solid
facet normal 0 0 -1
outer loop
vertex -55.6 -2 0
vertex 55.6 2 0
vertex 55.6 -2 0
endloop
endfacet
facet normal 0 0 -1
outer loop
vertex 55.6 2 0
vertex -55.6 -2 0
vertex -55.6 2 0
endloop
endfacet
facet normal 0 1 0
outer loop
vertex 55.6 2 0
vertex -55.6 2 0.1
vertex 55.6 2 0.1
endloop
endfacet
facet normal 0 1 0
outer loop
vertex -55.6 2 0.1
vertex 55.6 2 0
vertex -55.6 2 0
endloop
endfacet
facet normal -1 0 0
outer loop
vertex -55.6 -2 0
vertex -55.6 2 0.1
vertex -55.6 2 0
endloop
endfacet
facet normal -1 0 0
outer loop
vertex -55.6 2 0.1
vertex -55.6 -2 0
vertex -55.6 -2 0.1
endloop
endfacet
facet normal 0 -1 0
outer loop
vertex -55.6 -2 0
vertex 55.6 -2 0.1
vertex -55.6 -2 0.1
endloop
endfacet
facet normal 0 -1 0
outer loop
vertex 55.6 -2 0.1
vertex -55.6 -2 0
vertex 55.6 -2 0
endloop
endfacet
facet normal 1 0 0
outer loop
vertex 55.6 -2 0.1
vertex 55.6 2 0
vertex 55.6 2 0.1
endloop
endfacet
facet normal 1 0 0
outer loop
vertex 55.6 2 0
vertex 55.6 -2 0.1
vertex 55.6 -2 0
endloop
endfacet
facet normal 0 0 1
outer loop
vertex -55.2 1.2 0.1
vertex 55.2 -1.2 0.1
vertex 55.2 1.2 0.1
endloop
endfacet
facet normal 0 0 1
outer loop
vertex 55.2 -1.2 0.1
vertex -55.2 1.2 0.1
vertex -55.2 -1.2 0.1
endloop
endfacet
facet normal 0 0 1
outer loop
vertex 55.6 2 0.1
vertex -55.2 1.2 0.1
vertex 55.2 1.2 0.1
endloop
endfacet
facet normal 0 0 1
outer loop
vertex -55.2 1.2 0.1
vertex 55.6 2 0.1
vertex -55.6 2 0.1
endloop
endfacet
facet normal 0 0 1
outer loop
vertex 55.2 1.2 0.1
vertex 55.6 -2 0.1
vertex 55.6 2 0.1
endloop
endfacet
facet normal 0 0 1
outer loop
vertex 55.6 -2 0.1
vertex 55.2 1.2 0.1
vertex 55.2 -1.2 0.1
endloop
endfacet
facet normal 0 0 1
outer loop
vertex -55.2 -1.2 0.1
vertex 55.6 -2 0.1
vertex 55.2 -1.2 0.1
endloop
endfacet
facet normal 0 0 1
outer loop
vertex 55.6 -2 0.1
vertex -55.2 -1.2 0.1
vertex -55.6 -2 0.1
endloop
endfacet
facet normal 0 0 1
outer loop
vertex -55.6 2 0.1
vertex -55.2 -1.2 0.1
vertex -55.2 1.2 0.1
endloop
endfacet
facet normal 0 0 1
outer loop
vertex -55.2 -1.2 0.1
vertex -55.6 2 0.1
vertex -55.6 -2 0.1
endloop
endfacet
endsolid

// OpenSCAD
// file: ../p/box5-12.scad
use <../lib.scad>
function ldraw_lib__box5_12() = [
// 0 Box with 5 Faces without Any Edges
// 0 Name: box5-12.dat
// 0 Author: Chris Dee [cwdee]
// 0 !LDRAW_ORG Primitive UPDATE 2009-02
// 0 !LICENSE Licensed under CC BY 2.0 and CC BY 4.0 : see CAreadme.txt
// 
// 0 BFC CERTIFY CCW
  [0,"BFC","CERTIFY"],
  [0,"BFC","CCW"],
// 
// 0 !HISTORY 2009-09-03 [PTadmin] Official Update 2009-02
// 
// 
// 4 16 1 1 1 1 1 -1 -1 1 -1 -1 1 1
  [4,16,1,1,1,1,1,-1,-1,1,-1,-1,1,1],
// 4 16 -1 0 1 1 0 1 1 1 1 -1 1 1
  [4,16,-1,0,1,1,0,1,1,1,1,-1,1,1],
// 4 16 -1 0 -1 -1 0 1 -1 1 1 -1 1 -1
  [4,16,-1,0,-1,-1,0,1,-1,1,1,-1,1,-1],
// 4 16 1 0 -1 -1 0 -1 -1 1 -1 1 1 -1
  [4,16,1,0,-1,-1,0,-1,-1,1,-1,1,1,-1],
// 4 16 1 0 1 1 0 -1 1 1 -1 1 1 1
  [4,16,1,0,1,1,0,-1,1,1,-1,1,1,1],
// 0
];
makepoly(ldraw_lib__box5_12(), line=0.2);
// main file
use <../lib.scad>
use <../p/box5-12.scad>
function ldraw_lib__820672b() = [
// 0 Sticker  0.5 x 13.9 with White Line
// 0 Name: 820672b.dat
// 0 Author: Takeshi Takahashi [RainbowDolphin]
// 0 !LDRAW_ORG Part UPDATE 2022-04
// 0 !LICENSE Licensed under CC BY 2.0 and CC BY 4.0 : see CAreadme.txt
// 
// 0 BFC CERTIFY CCW
  [0,"BFC","CERTIFY"],
  [0,"BFC","CCW"],
// 
// 0 !KEYWORDS harbour, Seaport, Set 6541, ship
// 
// 0 !HISTORY 2022-07-18 [PTadmin] Official Update 2022-04
// 
// 
// 1 16 0 -0.25 0 139 0 0 0 0.25 0 0 0 5 box5-12.dat
  [1,16,0,-0.25,0,139,0,0,0,0.25,0,0,0,5, ldraw_lib__box5_12()],
// 0 BFC NOCLIP
  [0,"BFC","NOCLIP"],
// 4 15 138 -0.25 3 -138 -0.25 3 -138 -0.25 -3 138 -0.25 -3
  [4,15,138,-0.25,3,-138,-0.25,3,-138,-0.25,-3,138,-0.25,-3],
// 0 BFC CLIP
  [0,"BFC","CLIP"],
// 4 16 -139 -0.25 5 -138 -0.25 3 138 -0.25 3 139 -0.25 5
  [4,16,-139,-0.25,5,-138,-0.25,3,138,-0.25,3,139,-0.25,5],
// 4 16 139 -0.25 5 138 -0.25 3 138 -0.25 -3 139 -0.25 -5
  [4,16,139,-0.25,5,138,-0.25,3,138,-0.25,-3,139,-0.25,-5],
// 4 16 139 -0.25 -5 138 -0.25 -3 -138 -0.25 -3 -139 -0.25 -5
  [4,16,139,-0.25,-5,138,-0.25,-3,-138,-0.25,-3,-139,-0.25,-5],
// 4 16 -139 -0.25 -5 -138 -0.25 -3 -138 -0.25 3 -139 -0.25 5
  [4,16,-139,-0.25,-5,-138,-0.25,-3,-138,-0.25,3,-139,-0.25,5],
];
makepoly(ldraw_lib__820672b(), line=0.2);
